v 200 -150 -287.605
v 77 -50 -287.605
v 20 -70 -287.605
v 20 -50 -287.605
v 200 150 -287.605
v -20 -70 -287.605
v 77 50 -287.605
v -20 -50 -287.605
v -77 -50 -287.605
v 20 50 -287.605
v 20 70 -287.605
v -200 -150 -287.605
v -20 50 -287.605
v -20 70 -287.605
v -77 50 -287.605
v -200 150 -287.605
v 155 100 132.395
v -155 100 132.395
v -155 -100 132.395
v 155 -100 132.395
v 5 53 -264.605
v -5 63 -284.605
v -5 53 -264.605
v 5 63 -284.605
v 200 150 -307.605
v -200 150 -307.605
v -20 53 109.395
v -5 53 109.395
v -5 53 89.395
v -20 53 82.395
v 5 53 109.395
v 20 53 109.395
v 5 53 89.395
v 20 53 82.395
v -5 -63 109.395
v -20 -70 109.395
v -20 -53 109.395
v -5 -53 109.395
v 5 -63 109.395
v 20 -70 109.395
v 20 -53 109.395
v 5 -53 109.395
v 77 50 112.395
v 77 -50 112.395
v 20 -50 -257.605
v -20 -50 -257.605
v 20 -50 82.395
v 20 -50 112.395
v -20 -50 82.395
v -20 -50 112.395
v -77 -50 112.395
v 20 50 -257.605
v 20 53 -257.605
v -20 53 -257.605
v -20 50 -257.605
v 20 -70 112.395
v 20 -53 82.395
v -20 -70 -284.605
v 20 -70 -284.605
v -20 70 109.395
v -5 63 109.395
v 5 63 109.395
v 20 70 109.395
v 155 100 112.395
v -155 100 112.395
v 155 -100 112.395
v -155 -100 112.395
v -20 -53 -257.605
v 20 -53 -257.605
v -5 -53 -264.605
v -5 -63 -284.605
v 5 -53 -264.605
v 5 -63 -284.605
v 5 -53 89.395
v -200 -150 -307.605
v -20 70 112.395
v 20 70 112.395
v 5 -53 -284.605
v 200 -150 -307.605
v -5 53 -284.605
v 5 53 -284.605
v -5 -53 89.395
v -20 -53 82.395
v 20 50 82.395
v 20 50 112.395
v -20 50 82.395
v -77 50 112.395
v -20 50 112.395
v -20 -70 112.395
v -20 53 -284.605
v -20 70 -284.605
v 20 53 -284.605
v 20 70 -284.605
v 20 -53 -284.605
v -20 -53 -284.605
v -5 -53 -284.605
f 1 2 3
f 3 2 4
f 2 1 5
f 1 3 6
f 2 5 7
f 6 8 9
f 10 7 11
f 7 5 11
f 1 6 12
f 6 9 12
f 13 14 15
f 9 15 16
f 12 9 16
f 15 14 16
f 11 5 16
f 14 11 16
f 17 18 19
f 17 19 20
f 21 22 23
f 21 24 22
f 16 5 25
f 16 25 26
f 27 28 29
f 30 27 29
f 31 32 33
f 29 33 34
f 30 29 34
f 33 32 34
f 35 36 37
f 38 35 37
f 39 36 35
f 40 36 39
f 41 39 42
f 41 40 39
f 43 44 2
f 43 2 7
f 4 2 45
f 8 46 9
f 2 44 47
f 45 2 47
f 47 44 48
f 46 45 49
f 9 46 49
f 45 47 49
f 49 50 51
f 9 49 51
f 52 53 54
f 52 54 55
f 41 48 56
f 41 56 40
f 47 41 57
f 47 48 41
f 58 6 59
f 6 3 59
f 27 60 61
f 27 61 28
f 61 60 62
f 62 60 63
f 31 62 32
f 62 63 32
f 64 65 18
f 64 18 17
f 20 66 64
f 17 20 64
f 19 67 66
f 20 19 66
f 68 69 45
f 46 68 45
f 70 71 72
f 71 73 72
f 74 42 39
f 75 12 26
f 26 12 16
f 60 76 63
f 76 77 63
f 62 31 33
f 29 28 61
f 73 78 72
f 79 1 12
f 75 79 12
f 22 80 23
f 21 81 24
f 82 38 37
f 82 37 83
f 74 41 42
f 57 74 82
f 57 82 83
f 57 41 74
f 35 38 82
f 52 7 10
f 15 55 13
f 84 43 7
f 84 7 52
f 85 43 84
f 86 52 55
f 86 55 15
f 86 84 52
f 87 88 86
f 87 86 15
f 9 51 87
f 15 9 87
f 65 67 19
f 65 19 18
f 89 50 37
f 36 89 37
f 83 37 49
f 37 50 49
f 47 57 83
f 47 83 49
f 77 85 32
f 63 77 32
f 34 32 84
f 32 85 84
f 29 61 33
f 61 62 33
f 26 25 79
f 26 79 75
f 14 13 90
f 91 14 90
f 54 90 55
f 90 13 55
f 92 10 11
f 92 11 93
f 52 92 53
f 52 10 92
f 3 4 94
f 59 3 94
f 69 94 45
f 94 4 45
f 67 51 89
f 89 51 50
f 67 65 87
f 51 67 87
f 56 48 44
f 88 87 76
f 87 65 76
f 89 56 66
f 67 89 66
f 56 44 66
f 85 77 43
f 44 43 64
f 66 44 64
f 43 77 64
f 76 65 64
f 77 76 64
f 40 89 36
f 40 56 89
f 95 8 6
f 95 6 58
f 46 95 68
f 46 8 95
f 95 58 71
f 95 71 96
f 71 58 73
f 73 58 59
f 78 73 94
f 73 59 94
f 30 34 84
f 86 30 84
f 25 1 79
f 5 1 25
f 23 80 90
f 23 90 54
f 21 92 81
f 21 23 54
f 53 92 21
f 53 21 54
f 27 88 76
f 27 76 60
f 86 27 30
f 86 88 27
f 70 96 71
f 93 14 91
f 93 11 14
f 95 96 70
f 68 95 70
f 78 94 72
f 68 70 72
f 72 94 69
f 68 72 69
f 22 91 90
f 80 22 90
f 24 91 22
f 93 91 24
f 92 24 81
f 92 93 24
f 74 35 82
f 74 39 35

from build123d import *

# Parameters (mm, degrees)
SKETCH1_W            = 155
SKETCH1_H            = 100
BOSS_EXTRUDE1_DEPTH  = 10
SKETCH5_W            = 77
SKETCH5_H            = 50
BOSS_EXTRUDE5_DEPTH  = 200
SKETCH6_W            = 200
SKETCH6_H            = 150
BOSS_EXTRUDE12_DEPTH = 10
BOSS_EXTRUDE13_DEPTH = 10
BOSS_EXTRUDE14_DEPTH = 2.5
MIRROR2_COPY_1_DEPTH = 10
MIRROR2_COPY_2_DEPTH = 2.5
SCALE3_SCALE         = 2


with BuildPart() as part:
    # Sketch1 → Boss-Extrude1 (new body)
    with BuildSketch(Plane.XY):
        Rectangle(SKETCH1_W, SKETCH1_H)
    extrude(amount=BOSS_EXTRUDE1_DEPTH)

    # Sketch5 → Boss-Extrude5 (add)
    with BuildSketch(Plane(origin=(0, 0, 0), x_dir=(-1, 0, 0), z_dir=(0, 0, -1))):
        Rectangle(SKETCH5_W, SKETCH5_H)
    extrude(amount=BOSS_EXTRUDE5_DEPTH)

    # Sketch6 → Boss-Extrude12 (add)
    with BuildSketch(Plane(origin=(0, 0, -200), x_dir=(-1, 0, 0), z_dir=(0, 0, -1))):
        Rectangle(SKETCH6_W, SKETCH6_H)
    extrude(amount=BOSS_EXTRUDE12_DEPTH)

    # Sketch7 → Boss-Extrude13 (add, symmetric)
    with BuildSketch(Plane(origin=(0, 0, 0), x_dir=(0, 0, -1), z_dir=(1, 0, 0))):
        Polygon((15, -26.5), (15, -25), (0, -25), (0, -35), (1.5, -35), (1.5, -31.5), (1.5, -26.5), (11.5, -26.5), align=None)
    boss_extrude13 = extrude(amount=BOSS_EXTRUDE13_DEPTH, both=True)

    # Sketch7<3> → Boss-Extrude14 (add, symmetric)
    with BuildSketch(Plane(origin=(0, 0, 0), x_dir=(0, 0, -1), z_dir=(1, 0, 0))):
        Polygon((1.5, -31.5), (11.5, -26.5), (1.5, -26.5), align=None)
    boss_extrude14 = extrude(amount=BOSS_EXTRUDE14_DEPTH, both=True)

    # Mirror1: Boss-Extrude13, Boss-Extrude14 across plane
    add(boss_extrude13.mirror(Plane.ZX))
    add(boss_extrude14.mirror(Plane.ZX))

    # Mirror2: Boss-Extrude13, Boss-Extrude14 across plane
    add(boss_extrude13.mirror(Plane(origin=(0, 0, -100), x_dir=(1, 0, 0), z_dir=(0, 0, -1))))
    add(boss_extrude14.mirror(Plane(origin=(0, 0, -100), x_dir=(1, 0, 0), z_dir=(0, 0, -1))))

    # Mirror2 copy 1 sketch → Mirror2 copy 1 (add, symmetric)
    with BuildSketch(Plane(origin=(0, 0, -200), x_dir=(0, 0, 1), z_dir=(1, 0, 0))):
        Polygon((15, -26.5), (15, -25), (0, -25), (0, -35), (1.5, -35), (1.5, -31.5), (1.5, -26.5), (11.5, -26.5), align=None)
    extrude(amount=MIRROR2_COPY_1_DEPTH, both=True)

    # Mirror2 copy 2 sketch → Mirror2 copy 2 (add, symmetric)
    with BuildSketch(Plane(origin=(0, 0, -200), x_dir=(0, 0, 1), z_dir=(1, 0, 0))):
        Polygon((1.5, -31.5), (11.5, -26.5), (1.5, -26.5), align=None)
    extrude(amount=MIRROR2_COPY_2_DEPTH, both=True)


with BuildPart() as part_1:
    # Scale3: scaled about (0, 0, -112.394978507)
    add(part.part.scale(SCALE3_SCALE).moved(Location((0, 0, 112.394978507))))


solid = part_1.part
